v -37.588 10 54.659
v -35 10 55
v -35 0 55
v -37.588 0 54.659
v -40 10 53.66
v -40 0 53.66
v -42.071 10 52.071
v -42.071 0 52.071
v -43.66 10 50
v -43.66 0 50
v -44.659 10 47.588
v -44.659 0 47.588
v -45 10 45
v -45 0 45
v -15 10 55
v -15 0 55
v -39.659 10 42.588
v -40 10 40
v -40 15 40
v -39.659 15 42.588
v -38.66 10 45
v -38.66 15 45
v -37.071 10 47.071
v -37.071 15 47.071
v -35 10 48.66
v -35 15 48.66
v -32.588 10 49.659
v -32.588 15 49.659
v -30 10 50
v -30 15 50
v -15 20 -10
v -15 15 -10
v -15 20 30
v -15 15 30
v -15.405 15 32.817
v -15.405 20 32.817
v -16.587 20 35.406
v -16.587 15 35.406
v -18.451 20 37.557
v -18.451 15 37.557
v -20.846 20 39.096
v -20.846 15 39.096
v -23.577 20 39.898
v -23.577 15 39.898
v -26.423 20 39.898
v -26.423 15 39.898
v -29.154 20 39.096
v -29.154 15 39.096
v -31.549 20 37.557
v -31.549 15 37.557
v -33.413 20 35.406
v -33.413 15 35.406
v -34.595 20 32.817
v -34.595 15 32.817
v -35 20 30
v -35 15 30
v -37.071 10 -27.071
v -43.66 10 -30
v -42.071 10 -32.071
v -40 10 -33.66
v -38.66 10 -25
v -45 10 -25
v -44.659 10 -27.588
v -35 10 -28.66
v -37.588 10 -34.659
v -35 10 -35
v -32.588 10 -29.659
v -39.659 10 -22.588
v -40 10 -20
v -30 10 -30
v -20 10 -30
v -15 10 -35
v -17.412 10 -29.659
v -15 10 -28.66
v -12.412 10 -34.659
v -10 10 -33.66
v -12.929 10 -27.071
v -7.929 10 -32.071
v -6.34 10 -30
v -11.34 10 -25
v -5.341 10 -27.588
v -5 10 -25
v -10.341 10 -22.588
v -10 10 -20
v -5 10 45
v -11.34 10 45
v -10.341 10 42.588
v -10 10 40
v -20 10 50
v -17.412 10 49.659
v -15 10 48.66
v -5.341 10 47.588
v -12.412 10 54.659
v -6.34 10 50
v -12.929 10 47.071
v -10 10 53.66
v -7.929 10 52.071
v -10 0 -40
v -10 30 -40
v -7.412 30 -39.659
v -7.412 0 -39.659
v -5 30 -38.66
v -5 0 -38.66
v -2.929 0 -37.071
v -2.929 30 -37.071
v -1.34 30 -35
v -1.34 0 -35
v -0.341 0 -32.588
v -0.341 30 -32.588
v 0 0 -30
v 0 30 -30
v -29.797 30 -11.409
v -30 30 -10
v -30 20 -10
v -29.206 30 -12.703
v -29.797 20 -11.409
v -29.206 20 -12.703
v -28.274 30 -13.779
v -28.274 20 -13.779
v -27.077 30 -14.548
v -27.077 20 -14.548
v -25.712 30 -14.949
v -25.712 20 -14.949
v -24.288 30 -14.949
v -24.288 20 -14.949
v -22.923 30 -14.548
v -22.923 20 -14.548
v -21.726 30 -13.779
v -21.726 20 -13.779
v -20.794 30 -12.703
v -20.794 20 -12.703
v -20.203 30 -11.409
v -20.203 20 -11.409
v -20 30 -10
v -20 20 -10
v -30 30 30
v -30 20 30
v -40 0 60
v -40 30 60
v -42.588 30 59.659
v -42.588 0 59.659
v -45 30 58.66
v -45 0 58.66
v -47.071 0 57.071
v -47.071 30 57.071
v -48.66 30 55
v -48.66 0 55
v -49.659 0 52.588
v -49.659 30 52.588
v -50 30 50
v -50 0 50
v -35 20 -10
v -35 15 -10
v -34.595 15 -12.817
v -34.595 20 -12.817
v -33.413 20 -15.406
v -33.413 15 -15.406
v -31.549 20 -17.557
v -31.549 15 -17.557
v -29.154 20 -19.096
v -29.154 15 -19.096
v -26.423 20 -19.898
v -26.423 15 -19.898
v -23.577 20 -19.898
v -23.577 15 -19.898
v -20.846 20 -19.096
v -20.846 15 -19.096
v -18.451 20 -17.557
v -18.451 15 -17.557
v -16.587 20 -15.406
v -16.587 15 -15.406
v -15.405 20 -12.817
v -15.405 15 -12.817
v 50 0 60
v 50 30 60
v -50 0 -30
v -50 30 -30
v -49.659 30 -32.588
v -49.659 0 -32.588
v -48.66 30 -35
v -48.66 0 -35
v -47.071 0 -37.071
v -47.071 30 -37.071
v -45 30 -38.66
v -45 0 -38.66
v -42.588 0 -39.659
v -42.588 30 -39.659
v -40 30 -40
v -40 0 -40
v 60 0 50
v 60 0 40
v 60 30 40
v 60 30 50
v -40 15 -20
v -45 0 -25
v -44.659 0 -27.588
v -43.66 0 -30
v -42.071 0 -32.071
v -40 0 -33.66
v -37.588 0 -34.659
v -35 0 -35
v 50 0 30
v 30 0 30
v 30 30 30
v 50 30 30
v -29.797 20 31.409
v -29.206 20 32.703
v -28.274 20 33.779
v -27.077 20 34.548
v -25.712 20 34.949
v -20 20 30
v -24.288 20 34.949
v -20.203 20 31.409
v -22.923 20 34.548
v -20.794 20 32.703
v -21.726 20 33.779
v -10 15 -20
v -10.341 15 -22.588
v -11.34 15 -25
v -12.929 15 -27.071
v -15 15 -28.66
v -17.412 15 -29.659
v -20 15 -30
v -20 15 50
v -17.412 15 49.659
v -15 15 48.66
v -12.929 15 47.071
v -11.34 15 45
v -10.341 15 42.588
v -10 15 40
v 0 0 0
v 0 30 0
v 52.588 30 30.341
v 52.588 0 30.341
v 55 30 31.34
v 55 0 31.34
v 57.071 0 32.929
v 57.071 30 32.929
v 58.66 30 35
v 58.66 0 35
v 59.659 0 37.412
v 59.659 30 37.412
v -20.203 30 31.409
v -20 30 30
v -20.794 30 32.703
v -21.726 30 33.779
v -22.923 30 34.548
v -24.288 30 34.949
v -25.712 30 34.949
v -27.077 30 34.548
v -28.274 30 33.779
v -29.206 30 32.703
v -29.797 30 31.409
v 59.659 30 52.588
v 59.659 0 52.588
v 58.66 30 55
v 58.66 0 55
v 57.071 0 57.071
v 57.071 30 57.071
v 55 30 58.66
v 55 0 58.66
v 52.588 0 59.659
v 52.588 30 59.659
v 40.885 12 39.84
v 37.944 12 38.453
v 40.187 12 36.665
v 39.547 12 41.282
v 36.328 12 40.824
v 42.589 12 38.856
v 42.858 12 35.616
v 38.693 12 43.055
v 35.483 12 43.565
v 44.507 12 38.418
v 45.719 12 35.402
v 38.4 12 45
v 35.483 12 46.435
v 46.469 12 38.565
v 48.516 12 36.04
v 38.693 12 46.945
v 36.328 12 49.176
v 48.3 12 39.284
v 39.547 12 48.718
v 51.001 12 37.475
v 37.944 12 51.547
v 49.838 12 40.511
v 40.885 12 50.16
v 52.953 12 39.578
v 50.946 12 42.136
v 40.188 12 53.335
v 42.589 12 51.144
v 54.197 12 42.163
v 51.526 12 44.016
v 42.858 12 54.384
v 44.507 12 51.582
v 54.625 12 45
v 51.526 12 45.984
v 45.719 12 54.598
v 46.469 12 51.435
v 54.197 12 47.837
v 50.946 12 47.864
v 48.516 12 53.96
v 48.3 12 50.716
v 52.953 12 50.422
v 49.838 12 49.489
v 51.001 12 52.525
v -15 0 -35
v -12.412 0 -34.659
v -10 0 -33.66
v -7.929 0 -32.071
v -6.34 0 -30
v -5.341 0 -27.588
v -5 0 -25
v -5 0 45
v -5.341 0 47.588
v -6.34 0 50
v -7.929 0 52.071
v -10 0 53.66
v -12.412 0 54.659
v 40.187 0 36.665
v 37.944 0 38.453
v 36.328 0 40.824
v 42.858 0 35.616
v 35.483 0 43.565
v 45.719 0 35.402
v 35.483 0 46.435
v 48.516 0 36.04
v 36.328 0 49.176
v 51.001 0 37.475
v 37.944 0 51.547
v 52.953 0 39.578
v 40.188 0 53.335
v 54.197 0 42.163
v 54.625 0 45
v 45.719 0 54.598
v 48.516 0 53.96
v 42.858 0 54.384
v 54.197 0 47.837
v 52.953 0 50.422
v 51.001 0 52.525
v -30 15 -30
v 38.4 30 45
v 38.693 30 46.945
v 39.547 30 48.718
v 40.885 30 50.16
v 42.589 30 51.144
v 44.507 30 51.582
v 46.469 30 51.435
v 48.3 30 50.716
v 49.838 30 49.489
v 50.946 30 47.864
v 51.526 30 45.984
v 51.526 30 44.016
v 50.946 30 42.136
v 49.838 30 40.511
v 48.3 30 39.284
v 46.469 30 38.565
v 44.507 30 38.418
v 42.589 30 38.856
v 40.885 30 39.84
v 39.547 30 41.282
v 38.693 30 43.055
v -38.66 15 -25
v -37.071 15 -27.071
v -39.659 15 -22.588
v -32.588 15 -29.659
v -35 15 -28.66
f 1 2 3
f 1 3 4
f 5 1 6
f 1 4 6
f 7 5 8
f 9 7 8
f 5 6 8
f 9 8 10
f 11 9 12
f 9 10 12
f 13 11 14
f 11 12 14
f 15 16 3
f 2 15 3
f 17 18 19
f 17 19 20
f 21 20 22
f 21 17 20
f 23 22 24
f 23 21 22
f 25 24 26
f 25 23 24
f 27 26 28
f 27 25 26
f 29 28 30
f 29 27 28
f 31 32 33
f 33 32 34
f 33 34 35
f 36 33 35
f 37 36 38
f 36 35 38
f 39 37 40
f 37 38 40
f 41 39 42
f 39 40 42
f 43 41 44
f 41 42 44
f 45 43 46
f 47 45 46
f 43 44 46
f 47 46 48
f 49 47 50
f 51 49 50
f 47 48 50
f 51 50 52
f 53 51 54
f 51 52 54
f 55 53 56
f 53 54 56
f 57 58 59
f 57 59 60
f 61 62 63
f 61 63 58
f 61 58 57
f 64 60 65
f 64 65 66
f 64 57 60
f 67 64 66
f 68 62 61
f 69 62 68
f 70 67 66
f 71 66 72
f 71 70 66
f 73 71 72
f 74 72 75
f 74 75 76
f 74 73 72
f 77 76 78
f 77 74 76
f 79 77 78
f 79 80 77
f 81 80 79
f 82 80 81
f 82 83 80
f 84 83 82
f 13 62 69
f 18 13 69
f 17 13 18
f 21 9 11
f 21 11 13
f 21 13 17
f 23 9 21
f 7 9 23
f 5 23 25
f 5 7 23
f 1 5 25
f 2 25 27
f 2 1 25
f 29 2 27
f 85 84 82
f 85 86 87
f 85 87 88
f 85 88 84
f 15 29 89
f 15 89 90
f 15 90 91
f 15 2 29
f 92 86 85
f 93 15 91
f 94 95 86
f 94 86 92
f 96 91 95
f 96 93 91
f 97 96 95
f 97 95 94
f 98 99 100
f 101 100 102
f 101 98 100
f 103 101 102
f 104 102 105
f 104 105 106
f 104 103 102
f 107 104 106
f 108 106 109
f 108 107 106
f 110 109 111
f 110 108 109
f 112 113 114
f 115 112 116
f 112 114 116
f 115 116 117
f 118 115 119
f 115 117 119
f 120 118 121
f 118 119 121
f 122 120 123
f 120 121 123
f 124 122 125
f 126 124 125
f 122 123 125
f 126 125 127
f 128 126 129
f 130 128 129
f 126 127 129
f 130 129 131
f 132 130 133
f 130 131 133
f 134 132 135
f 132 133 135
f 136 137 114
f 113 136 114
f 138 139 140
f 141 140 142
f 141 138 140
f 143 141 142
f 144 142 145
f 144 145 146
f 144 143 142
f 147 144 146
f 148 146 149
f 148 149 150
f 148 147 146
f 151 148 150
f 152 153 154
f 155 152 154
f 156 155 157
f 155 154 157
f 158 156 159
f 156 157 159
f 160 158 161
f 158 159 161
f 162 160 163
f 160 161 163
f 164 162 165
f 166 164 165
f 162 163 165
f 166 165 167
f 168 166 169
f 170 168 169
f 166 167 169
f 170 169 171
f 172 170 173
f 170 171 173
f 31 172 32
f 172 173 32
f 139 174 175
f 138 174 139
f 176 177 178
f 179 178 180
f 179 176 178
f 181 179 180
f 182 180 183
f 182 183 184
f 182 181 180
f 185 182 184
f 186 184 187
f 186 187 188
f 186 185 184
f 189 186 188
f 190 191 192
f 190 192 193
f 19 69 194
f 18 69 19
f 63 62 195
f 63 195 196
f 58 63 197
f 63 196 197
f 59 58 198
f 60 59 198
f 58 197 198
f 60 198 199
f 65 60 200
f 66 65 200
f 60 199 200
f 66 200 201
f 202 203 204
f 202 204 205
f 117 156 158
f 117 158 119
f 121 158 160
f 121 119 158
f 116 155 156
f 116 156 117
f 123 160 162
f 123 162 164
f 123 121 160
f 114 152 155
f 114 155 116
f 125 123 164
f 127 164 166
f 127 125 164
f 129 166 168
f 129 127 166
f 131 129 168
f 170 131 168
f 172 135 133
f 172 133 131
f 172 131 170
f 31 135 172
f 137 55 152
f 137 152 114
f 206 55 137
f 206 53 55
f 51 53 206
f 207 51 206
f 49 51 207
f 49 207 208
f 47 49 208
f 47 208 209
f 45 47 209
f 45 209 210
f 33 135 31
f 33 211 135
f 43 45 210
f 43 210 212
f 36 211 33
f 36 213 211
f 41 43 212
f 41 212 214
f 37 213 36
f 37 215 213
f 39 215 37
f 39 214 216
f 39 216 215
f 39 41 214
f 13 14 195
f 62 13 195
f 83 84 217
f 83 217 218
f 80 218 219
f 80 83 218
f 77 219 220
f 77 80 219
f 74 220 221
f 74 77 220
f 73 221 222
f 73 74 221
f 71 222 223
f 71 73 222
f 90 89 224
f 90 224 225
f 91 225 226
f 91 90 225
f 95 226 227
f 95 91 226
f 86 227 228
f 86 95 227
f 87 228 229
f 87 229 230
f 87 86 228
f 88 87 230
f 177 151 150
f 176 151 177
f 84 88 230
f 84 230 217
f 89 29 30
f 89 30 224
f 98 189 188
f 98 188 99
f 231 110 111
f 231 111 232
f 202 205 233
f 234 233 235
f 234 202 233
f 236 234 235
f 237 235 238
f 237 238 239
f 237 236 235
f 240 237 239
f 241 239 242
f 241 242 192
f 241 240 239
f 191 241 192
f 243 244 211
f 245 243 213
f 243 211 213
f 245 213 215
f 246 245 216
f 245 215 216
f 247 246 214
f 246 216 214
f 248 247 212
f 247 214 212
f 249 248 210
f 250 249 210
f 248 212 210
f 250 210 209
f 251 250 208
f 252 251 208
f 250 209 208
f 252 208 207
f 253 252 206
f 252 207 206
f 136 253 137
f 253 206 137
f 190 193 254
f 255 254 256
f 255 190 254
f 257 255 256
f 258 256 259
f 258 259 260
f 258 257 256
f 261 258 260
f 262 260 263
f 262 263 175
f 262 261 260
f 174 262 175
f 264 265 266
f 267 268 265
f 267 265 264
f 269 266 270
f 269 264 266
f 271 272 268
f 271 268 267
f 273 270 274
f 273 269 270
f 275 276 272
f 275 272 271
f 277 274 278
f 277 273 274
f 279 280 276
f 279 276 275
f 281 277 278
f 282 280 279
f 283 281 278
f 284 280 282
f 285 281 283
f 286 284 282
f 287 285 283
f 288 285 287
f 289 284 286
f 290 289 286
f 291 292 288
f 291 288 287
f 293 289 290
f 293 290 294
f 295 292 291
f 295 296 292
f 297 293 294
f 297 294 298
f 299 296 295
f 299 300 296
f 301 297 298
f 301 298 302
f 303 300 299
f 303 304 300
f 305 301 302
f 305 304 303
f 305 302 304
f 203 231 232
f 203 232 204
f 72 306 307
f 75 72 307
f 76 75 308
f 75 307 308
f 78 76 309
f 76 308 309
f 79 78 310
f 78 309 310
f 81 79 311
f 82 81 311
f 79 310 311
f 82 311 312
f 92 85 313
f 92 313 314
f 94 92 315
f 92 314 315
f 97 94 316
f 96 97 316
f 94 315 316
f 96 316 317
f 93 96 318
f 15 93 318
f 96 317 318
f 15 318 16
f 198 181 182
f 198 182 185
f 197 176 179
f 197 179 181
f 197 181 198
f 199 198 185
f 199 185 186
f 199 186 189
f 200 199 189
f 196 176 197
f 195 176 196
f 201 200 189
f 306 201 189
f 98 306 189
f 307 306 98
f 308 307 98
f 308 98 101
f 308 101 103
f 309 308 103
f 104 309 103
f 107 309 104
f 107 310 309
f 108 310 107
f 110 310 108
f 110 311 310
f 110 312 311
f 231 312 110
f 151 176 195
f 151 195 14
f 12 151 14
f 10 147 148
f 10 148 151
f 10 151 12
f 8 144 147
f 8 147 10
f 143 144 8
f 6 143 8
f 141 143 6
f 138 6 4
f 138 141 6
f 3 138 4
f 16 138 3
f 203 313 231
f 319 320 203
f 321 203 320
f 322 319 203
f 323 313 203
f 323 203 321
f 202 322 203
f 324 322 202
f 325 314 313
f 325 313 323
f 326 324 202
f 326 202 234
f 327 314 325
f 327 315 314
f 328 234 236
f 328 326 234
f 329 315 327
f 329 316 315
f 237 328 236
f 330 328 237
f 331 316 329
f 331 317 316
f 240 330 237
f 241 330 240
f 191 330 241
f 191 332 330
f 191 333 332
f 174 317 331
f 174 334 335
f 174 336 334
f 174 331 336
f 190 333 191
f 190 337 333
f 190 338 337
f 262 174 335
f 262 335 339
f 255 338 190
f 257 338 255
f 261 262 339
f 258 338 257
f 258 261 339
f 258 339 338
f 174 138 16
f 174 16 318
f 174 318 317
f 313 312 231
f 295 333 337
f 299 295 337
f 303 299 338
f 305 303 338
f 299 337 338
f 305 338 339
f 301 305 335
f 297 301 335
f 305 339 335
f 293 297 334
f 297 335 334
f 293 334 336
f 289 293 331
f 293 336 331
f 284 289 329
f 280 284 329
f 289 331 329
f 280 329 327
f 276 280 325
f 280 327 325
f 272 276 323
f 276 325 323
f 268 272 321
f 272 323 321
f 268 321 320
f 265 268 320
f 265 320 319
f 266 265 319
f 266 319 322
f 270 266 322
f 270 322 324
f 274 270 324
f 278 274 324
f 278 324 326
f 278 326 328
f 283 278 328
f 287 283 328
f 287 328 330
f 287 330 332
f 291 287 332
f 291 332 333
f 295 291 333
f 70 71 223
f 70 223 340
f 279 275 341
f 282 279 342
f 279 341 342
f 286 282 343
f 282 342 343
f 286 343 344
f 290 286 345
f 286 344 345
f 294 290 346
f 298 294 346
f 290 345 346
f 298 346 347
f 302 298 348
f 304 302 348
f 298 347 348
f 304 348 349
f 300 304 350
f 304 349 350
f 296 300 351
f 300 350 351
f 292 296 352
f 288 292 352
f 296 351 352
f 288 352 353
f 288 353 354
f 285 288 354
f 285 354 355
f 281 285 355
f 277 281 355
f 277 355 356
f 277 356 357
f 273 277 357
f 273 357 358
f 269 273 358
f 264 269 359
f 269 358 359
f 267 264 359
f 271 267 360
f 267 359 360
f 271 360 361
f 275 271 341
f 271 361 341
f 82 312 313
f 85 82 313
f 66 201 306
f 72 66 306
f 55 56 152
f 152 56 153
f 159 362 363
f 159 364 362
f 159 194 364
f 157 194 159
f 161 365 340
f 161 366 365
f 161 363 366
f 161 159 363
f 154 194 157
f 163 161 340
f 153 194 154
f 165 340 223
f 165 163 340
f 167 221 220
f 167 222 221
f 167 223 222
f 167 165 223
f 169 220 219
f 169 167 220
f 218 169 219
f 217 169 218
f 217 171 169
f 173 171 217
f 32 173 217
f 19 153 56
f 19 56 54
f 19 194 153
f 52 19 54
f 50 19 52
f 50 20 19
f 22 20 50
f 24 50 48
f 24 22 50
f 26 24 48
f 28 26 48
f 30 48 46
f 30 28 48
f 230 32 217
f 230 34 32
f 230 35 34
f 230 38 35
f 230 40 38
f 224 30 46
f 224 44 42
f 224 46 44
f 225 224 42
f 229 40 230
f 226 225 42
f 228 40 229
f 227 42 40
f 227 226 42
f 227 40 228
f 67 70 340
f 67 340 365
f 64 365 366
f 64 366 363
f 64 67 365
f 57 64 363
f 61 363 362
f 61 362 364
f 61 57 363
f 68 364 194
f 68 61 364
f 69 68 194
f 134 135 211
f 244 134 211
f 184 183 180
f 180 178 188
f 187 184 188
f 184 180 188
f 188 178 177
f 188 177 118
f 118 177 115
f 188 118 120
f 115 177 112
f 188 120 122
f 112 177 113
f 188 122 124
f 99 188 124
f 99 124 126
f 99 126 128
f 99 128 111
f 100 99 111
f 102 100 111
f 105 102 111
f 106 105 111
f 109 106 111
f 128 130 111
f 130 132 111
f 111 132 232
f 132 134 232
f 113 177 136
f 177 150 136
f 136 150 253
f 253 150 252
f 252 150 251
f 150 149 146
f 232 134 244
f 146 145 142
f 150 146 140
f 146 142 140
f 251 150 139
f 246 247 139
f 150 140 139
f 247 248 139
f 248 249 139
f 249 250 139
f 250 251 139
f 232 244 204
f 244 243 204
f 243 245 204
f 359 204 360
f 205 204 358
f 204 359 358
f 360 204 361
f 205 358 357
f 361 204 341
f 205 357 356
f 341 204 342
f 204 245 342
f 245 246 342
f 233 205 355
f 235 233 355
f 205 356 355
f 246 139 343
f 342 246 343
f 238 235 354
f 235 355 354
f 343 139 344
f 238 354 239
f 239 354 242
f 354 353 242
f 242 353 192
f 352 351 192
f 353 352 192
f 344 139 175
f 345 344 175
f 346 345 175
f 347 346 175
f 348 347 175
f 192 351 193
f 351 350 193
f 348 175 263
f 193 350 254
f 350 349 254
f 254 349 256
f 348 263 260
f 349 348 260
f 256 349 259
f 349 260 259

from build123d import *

# Parameters (mm, degrees)
F0_W           = 40
F0_H           = 90
F1_DEPTH       = 30
F3_DEPTH       = 20
F4_DEPTH       = 30
F5_D           = 13.2
F5_CBORE_D     = 19.25
F5_CBORE_DEPTH = 12
F6_DEPTH       = 10
F7_DEPTH       = 15


with BuildPart() as f1:
    # F0 (on Front) → F1 (new body)
    with BuildSketch(Plane.XZ):
        with BuildLine():
            Line((0, -30), (0, 0))
            Line((0, 0), (30, 30))
            Line((30, 30), (50, 30))
            ThreePointArc((50, 30), (57.0710678119, 32.9289321881), (60, 40))
            Line((60, 40), (60, 50))
            ThreePointArc((60, 50), (57.0710678119, 57.0710678119), (50, 60))
            Line((50, 60), (-40, 60))
            ThreePointArc((-40, 60), (-47.0710678119, 57.0710678119), (-50, 50))
            Line((-50, 50), (-50, -30))
            ThreePointArc((-50, -30), (-47.0710678119, -37.0710678119), (-40, -40))
            Line((-40, -40), (-10, -40))
            ThreePointArc((-10, -40), (-2.9289321881, -37.0710678119), (0, -30))
        make_face()
        with Locations((-25, 10)):
            Rectangle(F0_W, F0_H, mode=Mode.SUBTRACT)
        with Locations((-25, 10)):
            Rectangle(F0_W, F0_H)
    extrude(amount=-F1_DEPTH)

    # F2 (on face) → F3 (cut)
    with BuildSketch(Plane.XZ):
        with BuildLine():
            Line((-15, -10), (-15, 30))
            ThreePointArc((-15, 30), (-25, 40), (-35, 30))
            Line((-35, 30), (-35, -10))
            ThreePointArc((-35, -10), (-25, -20), (-15, -10))
        make_face()
        with BuildLine():
            ThreePointArc((-30, 30), (-25, 35), (-20, 30))
            Line((-20, 30), (-20, -10))
            ThreePointArc((-20, -10), (-25, -15), (-30, -10))
            Line((-30, -10), (-30, 30))
        make_face(mode=Mode.SUBTRACT)
    extrude(amount=-F3_DEPTH, mode=Mode.SUBTRACT)

    # F2 (on face) → F4 (cut)
    with BuildSketch(Plane.XZ):
        with BuildLine():
            Line((-20, -10), (-20, 30))
            ThreePointArc((-20, 30), (-25, 35), (-30, 30))
            Line((-30, 30), (-30, -10))
            ThreePointArc((-30, -10), (-25, -15), (-20, -10))
        make_face()
    extrude(amount=-F4_DEPTH, mode=Mode.SUBTRACT)

    # F5 (through all)
    with Locations(Plane.XZ):
        with Locations((45, 45)):
            CounterBoreHole(F5_D / 2, F5_CBORE_D / 2, F5_CBORE_DEPTH)

    # F2 (on face) → F6 (cut)
    with BuildSketch(Plane.XZ):
        with BuildLine():
            ThreePointArc((-35, 55), (-42.0710678119, 52.0710678119), (-45, 45))
            Line((-45, 45), (-45, -25))
            ThreePointArc((-45, -25), (-42.0710678119, -32.0710678119), (-35, -35))
            Line((-35, -35), (-15, -35))
            ThreePointArc((-15, -35), (-7.9289321881, -32.0710678119), (-5, -25))
            Line((-5, -25), (-5, 45))
            ThreePointArc((-5, 45), (-7.9289321881, 52.0710678119), (-15, 55))
            Line((-15, 55), (-35, 55))
        make_face()
        with BuildLine():
            Line((-30.0000007451, 50.0000007451), (-19.9999992549, 50.0000007451))
            ThreePointArc((-19.9999992549, 50.0000007451), (-12.9289314431, 47.0710685569), (-9.9999992549, 40.0000007451))
            Line((-9.9999992549, 40.0000007451), (-9.9999992549, -20.0000007451))
            ThreePointArc((-9.9999992549, -20.0000007451), (-12.9289314431, -27.0710685569), (-19.9999992549, -30.0000007451))
            Line((-19.9999992549, -30.0000007451), (-30.0000007451, -30.0000007451))
            ThreePointArc((-30.0000007451, -30.0000007451), (-37.0710685569, -27.0710685569), (-40.0000007451, -20.0000007451))
            Line((-40.0000007451, -20.0000007451), (-40.0000007451, 40.0000007451))
            ThreePointArc((-40.0000007451, 40.0000007451), (-37.0710685569, 47.0710685569), (-30.0000007451, 50.0000007451))
        make_face(mode=Mode.SUBTRACT)
    extrude(amount=-F6_DEPTH, mode=Mode.SUBTRACT)

    # F7 (cut): a face of the model
    f7_faces = [f1.faces().sort_by_distance(p)[0] for p in [
        (-36.4669162447, 0, -26.4669162447),
    ]]
    extrude(f7_faces, amount=-F7_DEPTH, mode=Mode.SUBTRACT)


solid = f1.part
